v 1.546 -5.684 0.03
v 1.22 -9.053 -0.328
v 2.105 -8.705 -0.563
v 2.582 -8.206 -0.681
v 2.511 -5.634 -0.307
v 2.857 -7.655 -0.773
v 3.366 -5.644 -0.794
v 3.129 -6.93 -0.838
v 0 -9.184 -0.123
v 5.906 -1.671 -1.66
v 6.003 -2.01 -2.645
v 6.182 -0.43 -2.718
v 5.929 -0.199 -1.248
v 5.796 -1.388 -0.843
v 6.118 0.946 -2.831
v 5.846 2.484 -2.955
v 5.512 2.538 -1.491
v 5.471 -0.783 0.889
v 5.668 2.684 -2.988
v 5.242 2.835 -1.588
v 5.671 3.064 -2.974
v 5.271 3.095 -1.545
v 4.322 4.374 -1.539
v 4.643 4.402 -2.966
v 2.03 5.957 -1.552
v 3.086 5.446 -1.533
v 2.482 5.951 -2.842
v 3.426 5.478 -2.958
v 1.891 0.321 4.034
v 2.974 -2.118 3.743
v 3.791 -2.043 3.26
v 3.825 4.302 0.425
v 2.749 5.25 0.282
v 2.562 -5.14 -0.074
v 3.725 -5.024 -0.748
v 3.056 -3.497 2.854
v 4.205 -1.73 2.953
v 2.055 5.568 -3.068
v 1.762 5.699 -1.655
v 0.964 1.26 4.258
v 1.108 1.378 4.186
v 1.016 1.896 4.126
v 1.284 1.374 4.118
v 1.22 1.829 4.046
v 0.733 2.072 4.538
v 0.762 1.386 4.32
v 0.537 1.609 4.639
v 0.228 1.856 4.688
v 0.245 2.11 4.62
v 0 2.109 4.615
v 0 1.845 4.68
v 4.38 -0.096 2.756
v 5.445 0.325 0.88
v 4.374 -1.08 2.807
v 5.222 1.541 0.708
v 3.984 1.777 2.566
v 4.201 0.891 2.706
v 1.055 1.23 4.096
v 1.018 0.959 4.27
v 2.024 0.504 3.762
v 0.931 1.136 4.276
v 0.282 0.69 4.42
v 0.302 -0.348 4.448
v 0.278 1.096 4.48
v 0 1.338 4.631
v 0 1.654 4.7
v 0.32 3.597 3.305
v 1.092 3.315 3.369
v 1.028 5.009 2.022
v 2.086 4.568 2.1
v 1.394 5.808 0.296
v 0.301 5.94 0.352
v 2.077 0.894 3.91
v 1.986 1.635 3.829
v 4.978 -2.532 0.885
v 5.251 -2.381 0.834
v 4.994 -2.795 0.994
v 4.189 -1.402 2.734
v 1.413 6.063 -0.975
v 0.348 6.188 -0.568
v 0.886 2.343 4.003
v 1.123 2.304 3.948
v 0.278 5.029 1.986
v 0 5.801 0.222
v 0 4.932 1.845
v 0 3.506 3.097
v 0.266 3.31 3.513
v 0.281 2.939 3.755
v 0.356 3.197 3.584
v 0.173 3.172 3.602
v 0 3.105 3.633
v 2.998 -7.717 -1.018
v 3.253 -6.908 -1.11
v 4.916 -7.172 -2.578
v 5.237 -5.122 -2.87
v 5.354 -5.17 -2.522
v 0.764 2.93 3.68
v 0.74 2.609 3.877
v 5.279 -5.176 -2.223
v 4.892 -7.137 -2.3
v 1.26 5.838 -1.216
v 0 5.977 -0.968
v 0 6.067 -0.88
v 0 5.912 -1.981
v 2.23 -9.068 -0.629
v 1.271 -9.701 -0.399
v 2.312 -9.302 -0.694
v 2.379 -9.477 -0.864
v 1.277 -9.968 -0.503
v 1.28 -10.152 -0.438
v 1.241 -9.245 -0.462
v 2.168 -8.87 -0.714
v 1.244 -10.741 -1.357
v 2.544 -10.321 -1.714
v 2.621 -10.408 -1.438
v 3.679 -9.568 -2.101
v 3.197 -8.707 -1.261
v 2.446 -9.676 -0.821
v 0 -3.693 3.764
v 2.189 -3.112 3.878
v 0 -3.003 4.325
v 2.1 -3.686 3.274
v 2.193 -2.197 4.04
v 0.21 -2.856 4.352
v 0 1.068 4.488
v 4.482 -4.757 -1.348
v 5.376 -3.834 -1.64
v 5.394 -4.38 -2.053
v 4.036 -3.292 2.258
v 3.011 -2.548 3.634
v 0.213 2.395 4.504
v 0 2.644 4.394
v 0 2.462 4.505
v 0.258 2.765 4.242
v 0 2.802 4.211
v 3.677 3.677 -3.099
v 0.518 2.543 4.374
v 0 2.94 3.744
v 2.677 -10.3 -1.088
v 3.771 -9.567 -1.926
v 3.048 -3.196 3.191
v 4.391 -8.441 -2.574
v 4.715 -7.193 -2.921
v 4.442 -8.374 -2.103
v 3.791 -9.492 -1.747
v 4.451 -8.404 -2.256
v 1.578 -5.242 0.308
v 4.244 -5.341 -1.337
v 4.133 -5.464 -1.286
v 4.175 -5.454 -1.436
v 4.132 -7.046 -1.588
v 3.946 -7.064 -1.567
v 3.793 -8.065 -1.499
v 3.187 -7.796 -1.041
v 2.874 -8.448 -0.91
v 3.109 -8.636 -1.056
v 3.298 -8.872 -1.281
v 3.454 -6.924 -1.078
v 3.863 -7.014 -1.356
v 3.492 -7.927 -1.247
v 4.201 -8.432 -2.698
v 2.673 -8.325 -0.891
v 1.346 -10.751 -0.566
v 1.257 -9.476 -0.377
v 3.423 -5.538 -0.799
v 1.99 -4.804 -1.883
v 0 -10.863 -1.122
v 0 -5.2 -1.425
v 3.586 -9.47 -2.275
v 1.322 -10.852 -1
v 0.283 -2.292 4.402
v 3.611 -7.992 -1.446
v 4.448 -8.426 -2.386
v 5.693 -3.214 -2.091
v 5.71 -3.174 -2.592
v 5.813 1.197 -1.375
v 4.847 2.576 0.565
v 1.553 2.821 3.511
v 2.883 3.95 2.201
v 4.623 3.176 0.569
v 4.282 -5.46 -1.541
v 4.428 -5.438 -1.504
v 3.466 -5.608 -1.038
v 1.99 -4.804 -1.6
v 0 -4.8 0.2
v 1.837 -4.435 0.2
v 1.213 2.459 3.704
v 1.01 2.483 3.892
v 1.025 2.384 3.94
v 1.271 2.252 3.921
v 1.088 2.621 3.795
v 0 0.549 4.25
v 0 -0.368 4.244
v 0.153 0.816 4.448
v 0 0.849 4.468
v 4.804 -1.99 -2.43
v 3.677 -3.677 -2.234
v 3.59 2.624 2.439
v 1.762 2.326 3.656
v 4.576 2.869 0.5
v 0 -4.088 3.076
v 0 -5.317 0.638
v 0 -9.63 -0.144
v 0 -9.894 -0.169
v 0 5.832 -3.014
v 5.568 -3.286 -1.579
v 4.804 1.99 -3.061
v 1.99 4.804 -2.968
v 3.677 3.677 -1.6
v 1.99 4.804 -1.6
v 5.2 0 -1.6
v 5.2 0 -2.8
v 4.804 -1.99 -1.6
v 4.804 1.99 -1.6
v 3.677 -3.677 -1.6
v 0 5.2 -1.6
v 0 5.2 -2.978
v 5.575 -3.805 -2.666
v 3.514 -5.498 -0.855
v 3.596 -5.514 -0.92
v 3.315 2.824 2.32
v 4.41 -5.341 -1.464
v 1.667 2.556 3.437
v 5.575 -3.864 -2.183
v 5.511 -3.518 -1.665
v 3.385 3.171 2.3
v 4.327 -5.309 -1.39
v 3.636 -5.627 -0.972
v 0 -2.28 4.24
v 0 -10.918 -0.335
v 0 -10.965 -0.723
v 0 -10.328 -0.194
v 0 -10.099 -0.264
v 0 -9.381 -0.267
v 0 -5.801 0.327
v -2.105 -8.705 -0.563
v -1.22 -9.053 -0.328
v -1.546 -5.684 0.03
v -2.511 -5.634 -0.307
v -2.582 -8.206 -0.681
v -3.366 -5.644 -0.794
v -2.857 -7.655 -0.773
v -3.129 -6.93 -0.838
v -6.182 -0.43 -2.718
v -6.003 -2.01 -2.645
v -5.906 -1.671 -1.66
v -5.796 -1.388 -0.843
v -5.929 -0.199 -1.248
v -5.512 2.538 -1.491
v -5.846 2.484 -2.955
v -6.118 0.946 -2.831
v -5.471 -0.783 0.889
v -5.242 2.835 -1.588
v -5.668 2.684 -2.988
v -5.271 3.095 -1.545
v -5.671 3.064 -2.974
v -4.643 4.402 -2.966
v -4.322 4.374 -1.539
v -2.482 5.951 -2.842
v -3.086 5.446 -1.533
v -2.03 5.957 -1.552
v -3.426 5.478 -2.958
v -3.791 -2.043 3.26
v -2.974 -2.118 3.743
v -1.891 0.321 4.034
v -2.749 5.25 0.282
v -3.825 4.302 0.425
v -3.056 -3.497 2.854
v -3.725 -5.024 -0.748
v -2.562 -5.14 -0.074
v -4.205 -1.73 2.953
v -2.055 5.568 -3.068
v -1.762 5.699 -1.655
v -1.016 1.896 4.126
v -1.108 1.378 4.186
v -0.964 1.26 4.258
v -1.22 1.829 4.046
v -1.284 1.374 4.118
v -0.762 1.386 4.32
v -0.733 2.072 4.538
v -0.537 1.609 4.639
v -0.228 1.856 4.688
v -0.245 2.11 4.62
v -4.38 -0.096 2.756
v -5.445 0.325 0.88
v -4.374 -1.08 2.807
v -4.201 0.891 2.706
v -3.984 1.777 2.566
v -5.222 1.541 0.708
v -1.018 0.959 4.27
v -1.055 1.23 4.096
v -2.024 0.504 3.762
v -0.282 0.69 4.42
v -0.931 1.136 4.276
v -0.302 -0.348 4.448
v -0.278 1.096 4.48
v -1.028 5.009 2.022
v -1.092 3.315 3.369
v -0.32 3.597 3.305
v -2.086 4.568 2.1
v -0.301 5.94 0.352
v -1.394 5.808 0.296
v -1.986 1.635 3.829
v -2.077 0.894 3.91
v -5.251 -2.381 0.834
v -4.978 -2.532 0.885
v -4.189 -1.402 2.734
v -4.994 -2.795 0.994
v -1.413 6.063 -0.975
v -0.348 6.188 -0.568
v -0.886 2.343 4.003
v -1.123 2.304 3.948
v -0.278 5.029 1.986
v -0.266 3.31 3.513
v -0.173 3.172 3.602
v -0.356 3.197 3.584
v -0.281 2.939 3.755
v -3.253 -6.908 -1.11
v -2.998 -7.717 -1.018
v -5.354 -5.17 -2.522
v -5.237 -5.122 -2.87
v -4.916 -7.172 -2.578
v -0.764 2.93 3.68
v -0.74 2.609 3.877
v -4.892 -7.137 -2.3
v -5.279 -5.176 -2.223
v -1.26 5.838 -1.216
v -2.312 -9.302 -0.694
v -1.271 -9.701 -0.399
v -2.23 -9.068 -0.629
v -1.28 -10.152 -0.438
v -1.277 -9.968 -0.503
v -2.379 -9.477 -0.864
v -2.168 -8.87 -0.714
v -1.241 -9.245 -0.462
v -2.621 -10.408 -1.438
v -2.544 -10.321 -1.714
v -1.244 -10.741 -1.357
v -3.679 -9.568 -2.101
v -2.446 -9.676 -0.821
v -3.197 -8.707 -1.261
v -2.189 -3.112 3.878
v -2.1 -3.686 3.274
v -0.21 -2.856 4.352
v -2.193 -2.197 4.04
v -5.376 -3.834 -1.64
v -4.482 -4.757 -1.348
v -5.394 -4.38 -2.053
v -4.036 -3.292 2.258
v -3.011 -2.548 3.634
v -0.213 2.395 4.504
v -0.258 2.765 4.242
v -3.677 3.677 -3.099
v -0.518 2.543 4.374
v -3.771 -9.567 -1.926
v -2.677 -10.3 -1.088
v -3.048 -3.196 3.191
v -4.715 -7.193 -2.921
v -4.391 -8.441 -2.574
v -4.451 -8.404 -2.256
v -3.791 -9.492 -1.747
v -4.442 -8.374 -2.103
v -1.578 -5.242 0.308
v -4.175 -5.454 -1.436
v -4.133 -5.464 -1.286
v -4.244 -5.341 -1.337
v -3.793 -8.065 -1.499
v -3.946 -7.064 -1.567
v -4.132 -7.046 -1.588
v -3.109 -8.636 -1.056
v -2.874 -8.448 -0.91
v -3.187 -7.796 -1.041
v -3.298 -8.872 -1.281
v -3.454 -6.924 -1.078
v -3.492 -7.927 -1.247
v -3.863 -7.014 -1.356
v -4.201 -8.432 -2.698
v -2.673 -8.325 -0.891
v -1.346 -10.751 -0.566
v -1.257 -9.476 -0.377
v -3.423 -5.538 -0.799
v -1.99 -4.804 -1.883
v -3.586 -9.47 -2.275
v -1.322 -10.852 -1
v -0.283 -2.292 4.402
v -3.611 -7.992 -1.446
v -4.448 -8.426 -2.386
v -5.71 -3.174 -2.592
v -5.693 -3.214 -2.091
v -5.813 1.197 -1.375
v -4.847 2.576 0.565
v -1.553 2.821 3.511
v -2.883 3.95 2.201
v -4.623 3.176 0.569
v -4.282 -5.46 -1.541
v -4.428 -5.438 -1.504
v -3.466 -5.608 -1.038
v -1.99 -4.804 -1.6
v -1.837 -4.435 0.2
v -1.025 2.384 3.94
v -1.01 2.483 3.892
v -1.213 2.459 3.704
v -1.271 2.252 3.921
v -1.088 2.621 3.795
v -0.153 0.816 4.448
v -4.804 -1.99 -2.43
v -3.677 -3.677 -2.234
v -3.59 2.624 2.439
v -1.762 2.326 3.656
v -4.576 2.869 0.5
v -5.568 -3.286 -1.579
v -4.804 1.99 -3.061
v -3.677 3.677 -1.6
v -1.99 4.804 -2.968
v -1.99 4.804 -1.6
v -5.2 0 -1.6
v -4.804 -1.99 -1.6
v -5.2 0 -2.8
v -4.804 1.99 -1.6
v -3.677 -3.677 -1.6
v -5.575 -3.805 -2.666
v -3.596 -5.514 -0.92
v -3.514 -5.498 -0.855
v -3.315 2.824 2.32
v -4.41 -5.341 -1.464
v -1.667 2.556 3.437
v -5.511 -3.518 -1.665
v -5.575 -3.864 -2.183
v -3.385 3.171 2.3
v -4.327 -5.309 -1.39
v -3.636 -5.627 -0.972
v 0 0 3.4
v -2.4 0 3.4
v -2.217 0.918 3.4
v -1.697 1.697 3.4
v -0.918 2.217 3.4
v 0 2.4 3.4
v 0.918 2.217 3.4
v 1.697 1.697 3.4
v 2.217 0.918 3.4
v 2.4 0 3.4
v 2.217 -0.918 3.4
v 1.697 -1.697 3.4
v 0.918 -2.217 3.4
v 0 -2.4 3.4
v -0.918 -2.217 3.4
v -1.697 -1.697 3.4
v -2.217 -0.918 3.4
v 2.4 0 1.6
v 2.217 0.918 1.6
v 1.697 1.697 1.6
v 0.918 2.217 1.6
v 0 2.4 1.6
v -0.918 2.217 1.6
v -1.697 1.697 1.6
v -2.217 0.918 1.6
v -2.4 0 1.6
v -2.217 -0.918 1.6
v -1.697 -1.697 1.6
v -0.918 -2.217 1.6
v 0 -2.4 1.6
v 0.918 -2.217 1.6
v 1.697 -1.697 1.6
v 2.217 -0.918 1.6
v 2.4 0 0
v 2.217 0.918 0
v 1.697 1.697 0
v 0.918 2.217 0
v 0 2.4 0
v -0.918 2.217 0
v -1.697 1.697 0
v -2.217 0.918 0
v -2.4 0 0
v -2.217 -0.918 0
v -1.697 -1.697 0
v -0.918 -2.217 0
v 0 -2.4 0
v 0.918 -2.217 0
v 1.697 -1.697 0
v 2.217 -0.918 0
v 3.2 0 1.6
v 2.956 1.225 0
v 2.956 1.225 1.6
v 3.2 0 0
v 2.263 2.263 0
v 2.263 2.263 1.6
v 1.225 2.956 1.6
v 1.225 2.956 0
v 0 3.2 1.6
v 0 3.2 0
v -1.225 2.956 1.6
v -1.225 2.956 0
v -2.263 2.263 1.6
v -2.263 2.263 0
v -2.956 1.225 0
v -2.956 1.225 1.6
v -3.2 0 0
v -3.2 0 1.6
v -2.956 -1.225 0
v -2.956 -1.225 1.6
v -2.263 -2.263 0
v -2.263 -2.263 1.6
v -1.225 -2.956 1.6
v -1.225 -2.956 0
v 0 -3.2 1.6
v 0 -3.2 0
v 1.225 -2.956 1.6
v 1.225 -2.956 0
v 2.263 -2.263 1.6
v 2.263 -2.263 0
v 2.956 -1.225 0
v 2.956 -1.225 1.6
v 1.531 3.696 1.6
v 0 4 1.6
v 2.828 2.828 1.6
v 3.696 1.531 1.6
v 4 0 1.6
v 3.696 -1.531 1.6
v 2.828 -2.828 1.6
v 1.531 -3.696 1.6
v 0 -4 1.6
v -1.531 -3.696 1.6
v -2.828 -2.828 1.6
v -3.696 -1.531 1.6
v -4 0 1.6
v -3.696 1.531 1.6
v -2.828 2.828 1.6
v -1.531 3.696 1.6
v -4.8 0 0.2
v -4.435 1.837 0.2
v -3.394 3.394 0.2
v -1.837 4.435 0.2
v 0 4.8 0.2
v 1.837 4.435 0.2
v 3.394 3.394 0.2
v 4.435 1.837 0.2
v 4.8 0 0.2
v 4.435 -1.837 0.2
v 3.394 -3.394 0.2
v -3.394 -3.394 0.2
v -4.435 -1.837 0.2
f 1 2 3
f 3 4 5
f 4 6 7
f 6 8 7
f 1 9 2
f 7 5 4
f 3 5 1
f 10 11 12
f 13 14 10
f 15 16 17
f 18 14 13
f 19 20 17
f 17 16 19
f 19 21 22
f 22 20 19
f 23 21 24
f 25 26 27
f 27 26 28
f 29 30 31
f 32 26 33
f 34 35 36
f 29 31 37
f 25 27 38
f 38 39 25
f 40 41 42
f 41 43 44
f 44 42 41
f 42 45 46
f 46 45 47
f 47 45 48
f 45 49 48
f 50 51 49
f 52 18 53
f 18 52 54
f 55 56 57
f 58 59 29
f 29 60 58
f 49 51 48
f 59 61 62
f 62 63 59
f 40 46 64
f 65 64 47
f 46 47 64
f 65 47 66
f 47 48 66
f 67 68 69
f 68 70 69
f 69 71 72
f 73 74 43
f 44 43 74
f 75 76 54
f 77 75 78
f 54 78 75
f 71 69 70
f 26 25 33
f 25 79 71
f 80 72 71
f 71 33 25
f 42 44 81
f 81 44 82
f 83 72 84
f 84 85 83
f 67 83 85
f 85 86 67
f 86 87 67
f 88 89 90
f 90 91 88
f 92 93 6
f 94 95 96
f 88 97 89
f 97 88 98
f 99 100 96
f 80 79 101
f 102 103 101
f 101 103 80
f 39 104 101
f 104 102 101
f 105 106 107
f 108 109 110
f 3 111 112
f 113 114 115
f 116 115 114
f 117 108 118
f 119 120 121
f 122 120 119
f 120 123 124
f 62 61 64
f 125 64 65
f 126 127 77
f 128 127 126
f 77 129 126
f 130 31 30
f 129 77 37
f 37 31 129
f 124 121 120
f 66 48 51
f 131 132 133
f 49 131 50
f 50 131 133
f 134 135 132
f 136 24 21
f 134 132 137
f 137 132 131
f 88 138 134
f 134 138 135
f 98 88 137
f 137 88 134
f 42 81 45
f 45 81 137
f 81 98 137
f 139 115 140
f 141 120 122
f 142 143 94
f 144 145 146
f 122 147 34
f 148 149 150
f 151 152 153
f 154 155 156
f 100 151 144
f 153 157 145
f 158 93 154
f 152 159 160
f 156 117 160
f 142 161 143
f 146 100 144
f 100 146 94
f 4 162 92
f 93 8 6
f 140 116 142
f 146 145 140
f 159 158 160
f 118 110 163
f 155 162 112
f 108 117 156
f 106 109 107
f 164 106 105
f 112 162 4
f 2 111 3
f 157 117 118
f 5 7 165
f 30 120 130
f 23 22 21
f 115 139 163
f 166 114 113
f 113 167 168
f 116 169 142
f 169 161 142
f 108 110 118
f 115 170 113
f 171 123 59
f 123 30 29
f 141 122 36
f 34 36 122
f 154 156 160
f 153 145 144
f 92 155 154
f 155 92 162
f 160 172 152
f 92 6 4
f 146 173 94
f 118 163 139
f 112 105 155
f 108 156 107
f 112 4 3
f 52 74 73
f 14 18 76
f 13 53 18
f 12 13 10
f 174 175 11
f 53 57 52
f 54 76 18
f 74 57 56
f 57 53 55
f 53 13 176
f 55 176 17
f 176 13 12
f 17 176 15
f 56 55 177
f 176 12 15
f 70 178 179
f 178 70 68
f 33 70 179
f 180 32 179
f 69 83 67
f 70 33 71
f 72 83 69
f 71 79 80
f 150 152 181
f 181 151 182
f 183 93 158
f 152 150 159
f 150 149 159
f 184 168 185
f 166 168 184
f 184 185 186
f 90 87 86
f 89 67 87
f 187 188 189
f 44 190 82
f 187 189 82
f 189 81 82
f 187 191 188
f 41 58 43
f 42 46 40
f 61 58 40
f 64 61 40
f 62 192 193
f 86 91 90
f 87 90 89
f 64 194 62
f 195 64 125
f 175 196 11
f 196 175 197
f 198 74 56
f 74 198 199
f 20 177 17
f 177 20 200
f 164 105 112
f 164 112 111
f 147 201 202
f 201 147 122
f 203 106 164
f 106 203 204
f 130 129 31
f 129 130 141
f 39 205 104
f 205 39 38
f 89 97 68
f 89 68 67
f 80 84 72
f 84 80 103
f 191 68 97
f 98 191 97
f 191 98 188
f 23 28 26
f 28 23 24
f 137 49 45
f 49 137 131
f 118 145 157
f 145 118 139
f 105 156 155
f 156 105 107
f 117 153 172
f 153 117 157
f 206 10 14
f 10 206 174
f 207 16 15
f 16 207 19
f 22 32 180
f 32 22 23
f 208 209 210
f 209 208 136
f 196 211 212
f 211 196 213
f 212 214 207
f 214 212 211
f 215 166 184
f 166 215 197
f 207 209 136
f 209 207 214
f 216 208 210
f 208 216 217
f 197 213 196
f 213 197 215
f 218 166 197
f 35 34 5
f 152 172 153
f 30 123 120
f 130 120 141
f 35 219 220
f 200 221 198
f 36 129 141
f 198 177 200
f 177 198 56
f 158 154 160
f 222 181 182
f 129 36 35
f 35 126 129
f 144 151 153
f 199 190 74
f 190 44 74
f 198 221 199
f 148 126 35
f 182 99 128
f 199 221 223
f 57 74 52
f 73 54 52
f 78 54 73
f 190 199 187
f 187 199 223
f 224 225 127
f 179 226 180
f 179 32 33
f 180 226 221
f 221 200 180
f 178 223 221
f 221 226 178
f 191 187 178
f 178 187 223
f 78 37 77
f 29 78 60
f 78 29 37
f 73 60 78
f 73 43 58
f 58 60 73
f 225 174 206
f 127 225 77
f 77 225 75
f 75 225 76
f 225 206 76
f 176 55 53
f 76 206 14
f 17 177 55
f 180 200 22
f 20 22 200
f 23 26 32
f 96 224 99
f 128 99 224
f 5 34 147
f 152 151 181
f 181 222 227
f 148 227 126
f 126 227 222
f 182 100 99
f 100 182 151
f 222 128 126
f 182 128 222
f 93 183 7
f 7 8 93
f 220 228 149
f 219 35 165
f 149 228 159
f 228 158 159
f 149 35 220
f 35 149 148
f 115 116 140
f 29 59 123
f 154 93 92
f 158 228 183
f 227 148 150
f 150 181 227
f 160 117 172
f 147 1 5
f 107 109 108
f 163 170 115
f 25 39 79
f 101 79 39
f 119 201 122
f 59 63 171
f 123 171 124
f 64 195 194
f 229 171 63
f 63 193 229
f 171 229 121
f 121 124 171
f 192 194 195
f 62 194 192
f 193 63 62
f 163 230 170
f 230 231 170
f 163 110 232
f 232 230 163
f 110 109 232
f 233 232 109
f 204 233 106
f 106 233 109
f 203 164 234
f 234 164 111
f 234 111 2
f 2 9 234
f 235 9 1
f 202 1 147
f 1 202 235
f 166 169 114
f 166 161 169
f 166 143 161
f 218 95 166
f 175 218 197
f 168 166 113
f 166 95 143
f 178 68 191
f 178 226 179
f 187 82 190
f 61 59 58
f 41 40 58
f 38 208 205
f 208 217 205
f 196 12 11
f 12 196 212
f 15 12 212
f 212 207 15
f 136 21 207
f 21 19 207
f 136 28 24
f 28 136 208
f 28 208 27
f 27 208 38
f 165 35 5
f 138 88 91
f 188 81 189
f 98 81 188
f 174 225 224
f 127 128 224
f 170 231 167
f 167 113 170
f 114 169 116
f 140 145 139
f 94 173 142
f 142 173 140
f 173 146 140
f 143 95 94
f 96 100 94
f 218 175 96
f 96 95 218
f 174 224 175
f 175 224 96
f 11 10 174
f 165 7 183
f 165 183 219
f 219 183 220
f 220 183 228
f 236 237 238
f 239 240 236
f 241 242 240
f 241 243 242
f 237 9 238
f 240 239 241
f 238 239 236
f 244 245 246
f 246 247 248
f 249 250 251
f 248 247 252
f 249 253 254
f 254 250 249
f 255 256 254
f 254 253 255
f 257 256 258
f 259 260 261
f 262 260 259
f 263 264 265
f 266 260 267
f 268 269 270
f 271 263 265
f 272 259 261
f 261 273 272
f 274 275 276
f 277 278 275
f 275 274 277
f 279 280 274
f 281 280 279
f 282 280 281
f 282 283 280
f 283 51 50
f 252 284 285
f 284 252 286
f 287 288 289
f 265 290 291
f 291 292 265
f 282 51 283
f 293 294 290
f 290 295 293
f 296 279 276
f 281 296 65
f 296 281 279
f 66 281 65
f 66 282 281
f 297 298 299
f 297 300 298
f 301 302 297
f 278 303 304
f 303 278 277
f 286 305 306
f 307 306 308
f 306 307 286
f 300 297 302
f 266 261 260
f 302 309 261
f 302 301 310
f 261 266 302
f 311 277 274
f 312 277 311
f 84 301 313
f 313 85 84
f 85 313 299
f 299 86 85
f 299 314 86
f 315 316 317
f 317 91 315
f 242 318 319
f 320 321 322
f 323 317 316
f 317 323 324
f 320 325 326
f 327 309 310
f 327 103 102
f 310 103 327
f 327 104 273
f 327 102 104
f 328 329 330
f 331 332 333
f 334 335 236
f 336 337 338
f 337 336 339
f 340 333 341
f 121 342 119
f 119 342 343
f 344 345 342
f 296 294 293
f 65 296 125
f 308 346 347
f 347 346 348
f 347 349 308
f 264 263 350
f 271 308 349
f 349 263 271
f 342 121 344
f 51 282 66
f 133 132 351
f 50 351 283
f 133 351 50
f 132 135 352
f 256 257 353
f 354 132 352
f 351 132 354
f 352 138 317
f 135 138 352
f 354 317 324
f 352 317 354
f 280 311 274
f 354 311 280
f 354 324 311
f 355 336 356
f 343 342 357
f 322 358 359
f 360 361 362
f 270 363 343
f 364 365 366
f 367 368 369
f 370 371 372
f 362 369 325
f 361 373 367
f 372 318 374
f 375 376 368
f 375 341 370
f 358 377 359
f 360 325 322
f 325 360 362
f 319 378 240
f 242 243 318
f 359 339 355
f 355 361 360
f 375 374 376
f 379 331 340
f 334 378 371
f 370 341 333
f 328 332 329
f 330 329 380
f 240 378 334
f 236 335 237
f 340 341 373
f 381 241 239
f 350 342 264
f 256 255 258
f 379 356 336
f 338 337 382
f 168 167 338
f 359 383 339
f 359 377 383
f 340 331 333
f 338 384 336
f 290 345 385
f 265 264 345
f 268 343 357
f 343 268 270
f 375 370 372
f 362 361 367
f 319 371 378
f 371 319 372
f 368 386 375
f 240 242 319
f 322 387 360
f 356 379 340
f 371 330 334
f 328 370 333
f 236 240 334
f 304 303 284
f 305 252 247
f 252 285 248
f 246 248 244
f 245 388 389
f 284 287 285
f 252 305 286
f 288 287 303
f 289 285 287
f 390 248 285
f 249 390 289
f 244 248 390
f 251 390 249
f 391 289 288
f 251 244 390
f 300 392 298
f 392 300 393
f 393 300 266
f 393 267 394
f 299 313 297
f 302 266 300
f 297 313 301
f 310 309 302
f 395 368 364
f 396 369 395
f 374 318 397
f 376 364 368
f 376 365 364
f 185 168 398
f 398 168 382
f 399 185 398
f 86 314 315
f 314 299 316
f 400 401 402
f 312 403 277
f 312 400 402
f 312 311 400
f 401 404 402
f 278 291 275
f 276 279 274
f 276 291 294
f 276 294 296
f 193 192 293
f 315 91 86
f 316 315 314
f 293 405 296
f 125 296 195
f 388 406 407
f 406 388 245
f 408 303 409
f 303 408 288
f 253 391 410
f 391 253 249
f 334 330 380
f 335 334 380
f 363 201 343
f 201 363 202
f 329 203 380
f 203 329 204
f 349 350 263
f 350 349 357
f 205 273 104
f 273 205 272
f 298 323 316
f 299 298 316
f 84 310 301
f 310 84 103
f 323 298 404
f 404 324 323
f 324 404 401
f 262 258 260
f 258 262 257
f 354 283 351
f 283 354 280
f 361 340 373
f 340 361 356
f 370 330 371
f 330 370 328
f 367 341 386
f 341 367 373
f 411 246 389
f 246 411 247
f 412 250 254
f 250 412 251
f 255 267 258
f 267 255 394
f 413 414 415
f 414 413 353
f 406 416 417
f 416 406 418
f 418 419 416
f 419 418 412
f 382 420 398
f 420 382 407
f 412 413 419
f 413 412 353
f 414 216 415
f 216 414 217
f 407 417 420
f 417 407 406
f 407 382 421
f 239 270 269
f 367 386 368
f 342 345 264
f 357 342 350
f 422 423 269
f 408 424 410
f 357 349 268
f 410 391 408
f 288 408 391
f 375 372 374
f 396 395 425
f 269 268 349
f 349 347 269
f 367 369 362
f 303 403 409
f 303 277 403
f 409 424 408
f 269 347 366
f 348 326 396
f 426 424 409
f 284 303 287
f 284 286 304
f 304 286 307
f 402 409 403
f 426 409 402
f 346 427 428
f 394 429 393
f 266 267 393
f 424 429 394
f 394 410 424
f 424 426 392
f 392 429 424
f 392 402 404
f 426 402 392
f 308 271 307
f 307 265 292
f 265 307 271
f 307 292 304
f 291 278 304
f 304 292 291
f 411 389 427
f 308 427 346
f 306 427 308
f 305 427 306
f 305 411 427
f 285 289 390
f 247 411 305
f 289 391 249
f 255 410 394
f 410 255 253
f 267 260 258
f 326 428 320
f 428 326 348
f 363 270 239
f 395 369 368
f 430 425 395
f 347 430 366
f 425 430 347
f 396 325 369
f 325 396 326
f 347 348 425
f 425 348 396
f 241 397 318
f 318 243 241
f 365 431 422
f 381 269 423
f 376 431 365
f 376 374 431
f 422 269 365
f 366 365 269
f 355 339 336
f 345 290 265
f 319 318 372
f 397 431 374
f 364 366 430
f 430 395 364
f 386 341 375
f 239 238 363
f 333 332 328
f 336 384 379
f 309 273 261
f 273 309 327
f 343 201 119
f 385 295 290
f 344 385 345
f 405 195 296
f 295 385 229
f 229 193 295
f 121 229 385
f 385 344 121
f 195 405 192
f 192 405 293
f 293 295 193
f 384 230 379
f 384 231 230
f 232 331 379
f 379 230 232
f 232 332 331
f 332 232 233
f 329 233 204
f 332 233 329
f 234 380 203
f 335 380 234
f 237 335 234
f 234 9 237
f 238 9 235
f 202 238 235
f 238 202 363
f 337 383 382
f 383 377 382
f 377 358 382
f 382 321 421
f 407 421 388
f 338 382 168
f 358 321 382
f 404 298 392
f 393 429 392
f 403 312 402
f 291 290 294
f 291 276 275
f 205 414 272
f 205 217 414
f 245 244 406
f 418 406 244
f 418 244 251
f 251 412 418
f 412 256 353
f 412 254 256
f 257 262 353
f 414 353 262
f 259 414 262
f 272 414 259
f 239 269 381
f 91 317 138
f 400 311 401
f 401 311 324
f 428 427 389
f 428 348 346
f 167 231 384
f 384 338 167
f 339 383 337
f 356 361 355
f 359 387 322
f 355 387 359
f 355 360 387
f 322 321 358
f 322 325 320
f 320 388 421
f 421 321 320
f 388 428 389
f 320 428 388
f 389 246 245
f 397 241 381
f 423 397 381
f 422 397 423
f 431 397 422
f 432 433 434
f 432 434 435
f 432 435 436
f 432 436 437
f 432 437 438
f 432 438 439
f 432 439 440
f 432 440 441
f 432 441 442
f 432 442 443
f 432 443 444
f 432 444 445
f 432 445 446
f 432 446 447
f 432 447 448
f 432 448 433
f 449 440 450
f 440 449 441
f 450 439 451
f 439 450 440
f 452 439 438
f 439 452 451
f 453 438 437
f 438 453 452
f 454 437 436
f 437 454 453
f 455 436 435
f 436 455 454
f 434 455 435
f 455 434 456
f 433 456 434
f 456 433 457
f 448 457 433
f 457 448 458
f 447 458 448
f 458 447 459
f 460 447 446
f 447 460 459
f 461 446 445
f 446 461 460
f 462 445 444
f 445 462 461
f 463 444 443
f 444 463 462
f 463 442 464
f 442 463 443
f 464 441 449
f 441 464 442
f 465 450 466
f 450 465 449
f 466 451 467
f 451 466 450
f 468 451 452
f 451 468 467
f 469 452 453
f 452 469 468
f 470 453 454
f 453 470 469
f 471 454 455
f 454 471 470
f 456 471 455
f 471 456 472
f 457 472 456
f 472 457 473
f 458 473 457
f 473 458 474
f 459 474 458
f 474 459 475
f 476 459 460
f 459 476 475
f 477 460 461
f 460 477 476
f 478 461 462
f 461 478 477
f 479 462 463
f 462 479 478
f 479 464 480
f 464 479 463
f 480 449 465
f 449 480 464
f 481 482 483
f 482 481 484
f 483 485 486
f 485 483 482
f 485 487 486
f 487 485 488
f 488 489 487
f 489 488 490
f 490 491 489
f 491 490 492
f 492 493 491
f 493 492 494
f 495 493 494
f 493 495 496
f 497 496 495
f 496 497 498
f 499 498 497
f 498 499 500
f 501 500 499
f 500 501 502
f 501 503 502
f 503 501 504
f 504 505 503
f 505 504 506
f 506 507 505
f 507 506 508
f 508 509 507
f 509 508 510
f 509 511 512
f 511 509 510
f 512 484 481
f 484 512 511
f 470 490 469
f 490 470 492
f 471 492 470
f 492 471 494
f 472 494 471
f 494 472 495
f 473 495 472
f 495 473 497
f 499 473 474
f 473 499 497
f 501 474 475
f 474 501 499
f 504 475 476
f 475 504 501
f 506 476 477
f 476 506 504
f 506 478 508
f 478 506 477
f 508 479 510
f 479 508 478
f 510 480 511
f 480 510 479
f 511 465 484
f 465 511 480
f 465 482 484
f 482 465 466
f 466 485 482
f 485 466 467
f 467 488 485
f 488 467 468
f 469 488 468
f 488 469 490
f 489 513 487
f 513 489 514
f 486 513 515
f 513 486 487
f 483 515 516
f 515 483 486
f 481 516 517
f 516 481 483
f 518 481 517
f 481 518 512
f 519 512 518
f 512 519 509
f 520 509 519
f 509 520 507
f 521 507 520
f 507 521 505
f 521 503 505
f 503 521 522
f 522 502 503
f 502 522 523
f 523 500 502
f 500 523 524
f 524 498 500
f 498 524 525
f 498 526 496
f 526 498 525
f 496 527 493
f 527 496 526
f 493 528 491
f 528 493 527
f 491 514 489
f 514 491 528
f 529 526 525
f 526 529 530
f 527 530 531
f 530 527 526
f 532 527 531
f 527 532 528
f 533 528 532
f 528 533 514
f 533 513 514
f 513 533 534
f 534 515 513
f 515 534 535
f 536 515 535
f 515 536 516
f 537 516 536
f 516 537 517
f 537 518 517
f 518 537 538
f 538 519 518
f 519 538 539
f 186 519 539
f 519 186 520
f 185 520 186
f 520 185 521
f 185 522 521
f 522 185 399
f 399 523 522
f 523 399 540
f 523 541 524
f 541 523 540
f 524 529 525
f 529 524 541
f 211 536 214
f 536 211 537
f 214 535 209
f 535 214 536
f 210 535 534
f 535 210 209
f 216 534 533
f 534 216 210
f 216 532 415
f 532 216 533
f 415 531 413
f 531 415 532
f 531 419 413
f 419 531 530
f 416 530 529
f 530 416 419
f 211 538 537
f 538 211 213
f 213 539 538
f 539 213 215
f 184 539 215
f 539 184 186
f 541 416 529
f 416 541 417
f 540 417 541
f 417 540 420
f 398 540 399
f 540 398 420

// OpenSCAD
use <../lib.scad>
use <../p/2-4con12.scad>
use <../p/3-16con12.scad>
use <../p/4-4con5.scad>
use <../p/4-4cyli.scad>
use <../p/4-4disc.scad>
use <../p/4-4edge.scad>
use <../p/4-4ring4.scad>
use <s/93219s01.scad>
use <../p/stud4a.scad>
function ldraw_lib__93219() = [
// 0 Minifig Baseball Cap with Button on Top
// 0 Name: 93219.dat
// 0 Author: Ulrich Röder [UR]
// 0 !LDRAW_ORG Part UPDATE 2020-03
// 0 !LICENSE Licensed under CC BY 4.0 : see CAreadme.txt
// 
// 0 BFC CERTIFY CCW
  [0,"BFC","CERTIFY"],
  [0,"BFC","CCW"],
// 
// 0 !CATEGORY Minifig Headwear
// 0 !KEYWORDS Set 6001096
// 
// 0 !HISTORY 2020-12-29 [PTadmin] Official Update 2020-03
// 
// 
// 1 16 0 0 0 1 0 0 0 1 0 0 0 1 s\93219s01.dat
  [1,16,0,0,0,1,0,0,0,1,0,0,0,1, ldraw_lib__s__93219s01()],
// 1 16 0 0 0 -1 0 0 0 1 0 0 0 1 s\93219s01.dat
  [1,16,0,0,0,-1,0,0,0,1,0,0,0,1, ldraw_lib__s__93219s01()],
// 1 16 0 -8.5 0 -6 0 0 0 -1 0 0 0 6 4-4disc.dat
  [1,16,0,-8.5,0,-6,0,0,0,-1,0,0,0,6, ldraw_lib__4_4disc()],
// 1 16 0 -8.5 0 6 0 0 0 1 0 0 0 6 4-4edge.dat
  [1,16,0,-8.5,0,6,0,0,0,1,0,0,0,6, ldraw_lib__4_4edge()],
// 0 BFC INVERTNEXT
  [0,"BFC","INVERTNEXT"],
// 1 16 0 -8.5 0 6 0 0 0 4.5 0 0 0 6 4-4cyli.dat
  [1,16,0,-8.5,0,6,0,0,0,4.5,0,0,0,6, ldraw_lib__4_4cyli()],
// 1 16 0 -4 0 1 0 0 0 -1 0 0 0 1 stud4a.dat
  [1,16,0,-4,0,1,0,0,0,-1,0,0,0,1, ldraw_lib__stud4a()],
// 1 16 0 -4 0 8 0 0 0 1 0 0 0 8 4-4edge.dat
  [1,16,0,-4,0,8,0,0,0,1,0,0,0,8, ldraw_lib__4_4edge()],
// 1 16 0 -4 0 -2 0 0 0 -1 0 0 0 2 4-4ring4.dat
  [1,16,0,-4,0,-2,0,0,0,-1,0,0,0,2, ldraw_lib__4_4ring4()],
// 1 16 0 -4 0 10 0 0 0 1 0 0 0 10 4-4edge.dat
  [1,16,0,-4,0,10,0,0,0,1,0,0,0,10, ldraw_lib__4_4edge()],
// 0 BFC INVERTNEXT
  [0,"BFC","INVERTNEXT"],
// 1 16 0 -.5 0 -2 0 0 0 -3.5 0 0 0 2 4-4con5.dat
  [1,16,0,-.5,0,-2,0,0,0,-3.5,0,0,0,2, ldraw_lib__4_4con5()],
// 0 BFC INVERTNEXT
  [0,"BFC","INVERTNEXT"],
// 1 16 0 4 0 1 0 0 0 -4.5 0 0 0 1 2-4con12.dat
  [1,16,0,4,0,1,0,0,0,-4.5,0,0,0,1, ldraw_lib__2_4con12()],
// 0 BFC INVERTNEXT
  [0,"BFC","INVERTNEXT"],
// 1 16 0 4 0 1 0 0 0 -4.5 0 0 0 -1 3-16con12.dat
  [1,16,0,4,0,1,0,0,0,-4.5,0,0,0,-1, ldraw_lib__3_16con12()],
// 0 BFC INVERTNEXT
  [0,"BFC","INVERTNEXT"],
// 1 16 0 4 0 -1 0 0 0 -4.5 0 0 0 -1 3-16con12.dat
  [1,16,0,4,0,-1,0,0,0,-4.5,0,0,0,-1, ldraw_lib__3_16con12()],
];
module ldraw_lib__93219(step=0, col=false, unit=2/5, alt=false, line=0.2, solid=!$preview)
    makepoly(ldraw_lib__93219(), step=step, col=col, unit=unit, alt=alt, line=line, solid=solid);
ldraw_lib__93219(line=0.2);
